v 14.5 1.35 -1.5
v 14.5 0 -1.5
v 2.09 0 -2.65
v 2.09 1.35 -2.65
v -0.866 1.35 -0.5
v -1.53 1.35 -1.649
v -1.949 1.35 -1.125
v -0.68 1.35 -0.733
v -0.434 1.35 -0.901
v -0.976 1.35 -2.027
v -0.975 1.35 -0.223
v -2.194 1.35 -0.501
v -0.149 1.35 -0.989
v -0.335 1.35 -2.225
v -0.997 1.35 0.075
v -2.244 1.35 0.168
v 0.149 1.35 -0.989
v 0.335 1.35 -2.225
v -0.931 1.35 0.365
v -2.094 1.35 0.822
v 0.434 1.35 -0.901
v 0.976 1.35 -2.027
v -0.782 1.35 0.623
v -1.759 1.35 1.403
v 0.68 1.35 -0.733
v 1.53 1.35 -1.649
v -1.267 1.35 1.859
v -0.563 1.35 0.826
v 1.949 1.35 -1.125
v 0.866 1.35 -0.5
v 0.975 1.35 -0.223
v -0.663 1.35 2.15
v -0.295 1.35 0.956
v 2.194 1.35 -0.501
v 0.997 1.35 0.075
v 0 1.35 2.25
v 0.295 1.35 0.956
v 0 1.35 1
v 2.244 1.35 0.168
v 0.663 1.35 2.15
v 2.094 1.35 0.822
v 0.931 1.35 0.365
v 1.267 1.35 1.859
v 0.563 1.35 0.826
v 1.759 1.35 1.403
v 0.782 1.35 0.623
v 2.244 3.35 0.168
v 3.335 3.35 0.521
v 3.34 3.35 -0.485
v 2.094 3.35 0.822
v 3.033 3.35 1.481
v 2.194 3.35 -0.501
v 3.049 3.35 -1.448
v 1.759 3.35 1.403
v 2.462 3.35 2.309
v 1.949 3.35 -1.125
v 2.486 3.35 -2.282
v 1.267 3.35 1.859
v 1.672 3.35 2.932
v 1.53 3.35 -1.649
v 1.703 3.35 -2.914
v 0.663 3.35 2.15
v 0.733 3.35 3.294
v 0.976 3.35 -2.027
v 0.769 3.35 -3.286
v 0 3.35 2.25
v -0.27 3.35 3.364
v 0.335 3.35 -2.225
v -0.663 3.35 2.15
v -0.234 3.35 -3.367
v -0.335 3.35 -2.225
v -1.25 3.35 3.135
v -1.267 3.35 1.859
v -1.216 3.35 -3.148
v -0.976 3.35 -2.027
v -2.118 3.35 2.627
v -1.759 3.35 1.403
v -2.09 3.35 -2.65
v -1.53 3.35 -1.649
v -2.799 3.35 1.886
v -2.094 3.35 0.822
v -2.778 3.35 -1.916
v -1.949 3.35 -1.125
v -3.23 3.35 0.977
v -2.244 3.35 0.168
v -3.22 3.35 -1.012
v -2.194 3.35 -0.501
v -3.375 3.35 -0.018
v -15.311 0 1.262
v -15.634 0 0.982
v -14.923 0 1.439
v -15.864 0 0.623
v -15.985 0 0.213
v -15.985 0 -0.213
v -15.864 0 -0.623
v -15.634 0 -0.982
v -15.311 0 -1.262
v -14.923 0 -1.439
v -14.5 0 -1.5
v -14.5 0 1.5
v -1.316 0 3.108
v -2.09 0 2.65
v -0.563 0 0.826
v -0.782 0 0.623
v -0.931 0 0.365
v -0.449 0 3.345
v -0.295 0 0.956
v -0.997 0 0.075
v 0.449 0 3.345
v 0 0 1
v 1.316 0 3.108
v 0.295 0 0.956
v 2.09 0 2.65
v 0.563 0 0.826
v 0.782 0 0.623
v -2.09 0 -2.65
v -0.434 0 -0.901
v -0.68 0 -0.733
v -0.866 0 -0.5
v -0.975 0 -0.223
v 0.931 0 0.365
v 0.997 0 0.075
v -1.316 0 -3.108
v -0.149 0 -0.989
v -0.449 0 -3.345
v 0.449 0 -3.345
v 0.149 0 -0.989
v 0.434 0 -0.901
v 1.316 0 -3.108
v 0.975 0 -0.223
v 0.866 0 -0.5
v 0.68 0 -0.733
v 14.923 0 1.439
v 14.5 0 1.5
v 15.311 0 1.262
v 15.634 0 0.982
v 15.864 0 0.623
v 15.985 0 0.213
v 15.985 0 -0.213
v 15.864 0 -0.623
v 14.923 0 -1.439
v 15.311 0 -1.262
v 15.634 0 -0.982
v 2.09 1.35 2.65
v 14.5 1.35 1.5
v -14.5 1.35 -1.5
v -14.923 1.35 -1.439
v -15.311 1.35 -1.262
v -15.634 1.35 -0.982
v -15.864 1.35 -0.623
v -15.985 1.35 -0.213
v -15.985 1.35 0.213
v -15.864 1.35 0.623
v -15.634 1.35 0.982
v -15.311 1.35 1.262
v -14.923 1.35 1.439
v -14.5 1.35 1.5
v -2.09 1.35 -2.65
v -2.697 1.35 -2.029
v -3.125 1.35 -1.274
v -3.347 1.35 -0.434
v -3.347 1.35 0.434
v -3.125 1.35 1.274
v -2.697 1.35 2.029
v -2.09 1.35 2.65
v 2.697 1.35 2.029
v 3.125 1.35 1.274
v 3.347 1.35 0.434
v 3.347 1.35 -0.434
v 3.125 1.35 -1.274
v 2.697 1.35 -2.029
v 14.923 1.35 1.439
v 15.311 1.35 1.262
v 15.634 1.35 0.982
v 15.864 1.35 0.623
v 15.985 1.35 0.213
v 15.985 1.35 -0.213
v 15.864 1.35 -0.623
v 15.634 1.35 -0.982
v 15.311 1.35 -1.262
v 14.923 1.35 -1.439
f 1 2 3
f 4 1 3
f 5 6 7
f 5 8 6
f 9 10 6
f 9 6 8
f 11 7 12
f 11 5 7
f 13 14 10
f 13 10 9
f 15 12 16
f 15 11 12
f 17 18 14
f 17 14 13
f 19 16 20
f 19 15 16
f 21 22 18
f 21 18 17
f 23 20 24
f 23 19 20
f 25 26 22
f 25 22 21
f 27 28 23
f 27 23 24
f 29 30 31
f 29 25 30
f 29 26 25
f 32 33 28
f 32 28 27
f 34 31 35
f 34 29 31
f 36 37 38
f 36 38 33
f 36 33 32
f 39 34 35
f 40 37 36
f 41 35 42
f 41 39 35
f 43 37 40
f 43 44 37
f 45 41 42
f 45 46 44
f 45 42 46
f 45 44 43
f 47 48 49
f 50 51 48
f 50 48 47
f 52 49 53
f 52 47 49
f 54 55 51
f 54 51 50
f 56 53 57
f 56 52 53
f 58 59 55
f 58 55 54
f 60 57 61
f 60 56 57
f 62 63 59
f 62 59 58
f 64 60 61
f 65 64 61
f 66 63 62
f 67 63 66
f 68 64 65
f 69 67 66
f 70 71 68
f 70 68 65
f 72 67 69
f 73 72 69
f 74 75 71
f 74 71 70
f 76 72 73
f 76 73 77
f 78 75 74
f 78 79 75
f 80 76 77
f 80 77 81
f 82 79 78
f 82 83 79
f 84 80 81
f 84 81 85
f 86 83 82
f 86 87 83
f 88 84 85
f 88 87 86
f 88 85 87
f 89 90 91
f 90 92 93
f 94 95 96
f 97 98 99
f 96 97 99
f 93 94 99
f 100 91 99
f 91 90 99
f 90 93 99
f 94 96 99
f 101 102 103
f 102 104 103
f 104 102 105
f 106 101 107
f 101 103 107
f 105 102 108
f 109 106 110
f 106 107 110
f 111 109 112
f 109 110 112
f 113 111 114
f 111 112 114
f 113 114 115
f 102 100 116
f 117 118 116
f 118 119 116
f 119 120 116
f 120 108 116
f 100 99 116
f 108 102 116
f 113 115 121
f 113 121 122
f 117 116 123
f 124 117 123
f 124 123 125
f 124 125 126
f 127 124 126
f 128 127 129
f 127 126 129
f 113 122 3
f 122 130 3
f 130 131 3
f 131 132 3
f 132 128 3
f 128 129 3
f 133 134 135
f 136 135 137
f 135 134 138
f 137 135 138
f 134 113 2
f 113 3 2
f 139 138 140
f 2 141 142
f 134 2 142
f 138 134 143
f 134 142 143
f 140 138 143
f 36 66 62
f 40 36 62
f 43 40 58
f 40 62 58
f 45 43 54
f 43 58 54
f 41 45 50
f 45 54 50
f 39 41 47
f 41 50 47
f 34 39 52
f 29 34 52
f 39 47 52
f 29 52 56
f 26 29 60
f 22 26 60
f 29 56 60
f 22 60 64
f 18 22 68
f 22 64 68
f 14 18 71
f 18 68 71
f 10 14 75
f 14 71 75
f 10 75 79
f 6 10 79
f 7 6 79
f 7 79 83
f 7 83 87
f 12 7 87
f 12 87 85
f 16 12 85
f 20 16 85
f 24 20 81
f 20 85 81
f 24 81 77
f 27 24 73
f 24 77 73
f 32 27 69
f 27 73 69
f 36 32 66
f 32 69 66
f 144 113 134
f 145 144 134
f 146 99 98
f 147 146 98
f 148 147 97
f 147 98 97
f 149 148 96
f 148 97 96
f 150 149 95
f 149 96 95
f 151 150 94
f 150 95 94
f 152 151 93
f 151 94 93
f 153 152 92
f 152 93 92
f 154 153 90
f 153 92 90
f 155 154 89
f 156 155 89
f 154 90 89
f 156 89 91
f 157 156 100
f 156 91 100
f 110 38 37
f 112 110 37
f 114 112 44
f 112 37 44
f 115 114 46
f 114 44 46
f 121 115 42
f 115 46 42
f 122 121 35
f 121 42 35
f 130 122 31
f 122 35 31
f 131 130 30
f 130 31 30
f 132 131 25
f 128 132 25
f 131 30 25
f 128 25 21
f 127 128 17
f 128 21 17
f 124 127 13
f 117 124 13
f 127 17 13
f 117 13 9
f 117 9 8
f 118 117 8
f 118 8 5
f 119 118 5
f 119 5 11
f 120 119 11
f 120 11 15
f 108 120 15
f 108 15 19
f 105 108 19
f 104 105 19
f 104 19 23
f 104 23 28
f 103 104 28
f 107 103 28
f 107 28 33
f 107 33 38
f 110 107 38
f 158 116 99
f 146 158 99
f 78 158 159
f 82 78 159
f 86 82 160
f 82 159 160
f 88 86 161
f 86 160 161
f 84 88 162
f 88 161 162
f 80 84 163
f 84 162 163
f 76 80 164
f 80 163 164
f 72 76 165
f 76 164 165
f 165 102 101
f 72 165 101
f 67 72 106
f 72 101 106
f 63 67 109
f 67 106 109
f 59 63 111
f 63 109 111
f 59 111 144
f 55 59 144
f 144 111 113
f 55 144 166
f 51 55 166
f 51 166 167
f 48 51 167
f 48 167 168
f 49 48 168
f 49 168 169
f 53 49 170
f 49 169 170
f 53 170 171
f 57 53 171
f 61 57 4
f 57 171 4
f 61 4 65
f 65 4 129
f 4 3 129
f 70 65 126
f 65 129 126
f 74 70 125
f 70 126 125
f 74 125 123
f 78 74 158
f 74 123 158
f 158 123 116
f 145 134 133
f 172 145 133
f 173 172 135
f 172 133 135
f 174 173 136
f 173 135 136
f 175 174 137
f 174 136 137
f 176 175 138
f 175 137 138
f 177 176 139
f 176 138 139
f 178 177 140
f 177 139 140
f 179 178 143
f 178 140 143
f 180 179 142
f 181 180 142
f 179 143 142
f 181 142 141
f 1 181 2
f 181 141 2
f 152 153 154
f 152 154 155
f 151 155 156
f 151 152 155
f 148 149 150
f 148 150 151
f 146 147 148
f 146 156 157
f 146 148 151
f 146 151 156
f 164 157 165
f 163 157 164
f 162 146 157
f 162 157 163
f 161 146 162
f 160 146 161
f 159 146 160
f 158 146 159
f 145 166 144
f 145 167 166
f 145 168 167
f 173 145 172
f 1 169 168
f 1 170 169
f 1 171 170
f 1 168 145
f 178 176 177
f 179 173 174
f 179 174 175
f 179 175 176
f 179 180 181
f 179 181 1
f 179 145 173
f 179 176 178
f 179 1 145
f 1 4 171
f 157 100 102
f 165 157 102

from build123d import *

# Parameters (mm, degrees)
SCHIZZO1_R                   = 3.375
ESTRUSIONE_ESTRUSIONE1_DEPTH = 1.35
SCHIZZO2_R                   = 3.375
ESTRUSIONE_ESTRUSIONE2_DEPTH = 2
SCHIZZO3_R                   = 2.25
TAGLIO_ESTRUSIONE1_DEPTH     = 2
SCHIZZO4_R                   = 1
TAGLIO_ESTRUSIONE2_DEPTH     = 17.47393775


with BuildPart() as part:
    # Schizzo1 → Estrusione-Estrusione1 (new body)
    with BuildSketch(Plane(origin=(0, 0, 0), x_dir=(1, 0, 0), z_dir=(0, 1, 0))):
        Circle(SCHIZZO1_R)
        with BuildLine():
            Line((-2.090005981, 2.65), (-14.5, 1.5))
            ThreePointArc((-14.5, 1.5), (-16, 0), (-14.5, -1.5))
            Line((-14.5, -1.5), (-2.090005981, -2.65))
            Line((-2.090005981, -2.65), (-2.090005981, 2.65))
        make_face()
        with BuildLine():
            Line((2.090005981, 2.65), (2.090005981, -2.65))
            Line((2.090005981, -2.65), (14.5, -1.5))
            ThreePointArc((14.5, -1.5), (16, 0), (14.5, 1.5))
            Line((14.5, 1.5), (2.090005981, 2.65))
        make_face()
    extrude(amount=ESTRUSIONE_ESTRUSIONE1_DEPTH)

    # Schizzo2 → Estrusione-Estrusione2 (add)
    with BuildSketch(Plane(origin=(0, 1.35, 0), x_dir=(1, 0, 0), z_dir=(0, 1, 0))):
        with Locations(Location((0, 0, 0), (0, 0, 128.262191128))):
            Circle(SCHIZZO2_R)
    extrude(amount=ESTRUSIONE_ESTRUSIONE2_DEPTH)

    # Schizzo3 → Taglio-Estrusione1 (cut)
    with BuildSketch(Plane(origin=(0, 3.35, 0), x_dir=(1, 0, 0), z_dir=(0, 1, 0))):
        with Locations(Location((0, 0, 0), (0, 0, 270))):
            Circle(SCHIZZO3_R)
    extrude(amount=-TAGLIO_ESTRUSIONE1_DEPTH, mode=Mode.SUBTRACT)

    # Schizzo4 → Taglio-Estrusione2 (cut, through all)
    with BuildSketch(Plane(origin=(0, 1.35, 0), x_dir=(1, 0, 0), z_dir=(0, 1, 0))):
        with Locations(Location((0, 0, 0), (0, 0, 270))):
            Circle(SCHIZZO4_R)
    extrude(amount=-TAGLIO_ESTRUSIONE2_DEPTH, mode=Mode.SUBTRACT)


solid = part.part
